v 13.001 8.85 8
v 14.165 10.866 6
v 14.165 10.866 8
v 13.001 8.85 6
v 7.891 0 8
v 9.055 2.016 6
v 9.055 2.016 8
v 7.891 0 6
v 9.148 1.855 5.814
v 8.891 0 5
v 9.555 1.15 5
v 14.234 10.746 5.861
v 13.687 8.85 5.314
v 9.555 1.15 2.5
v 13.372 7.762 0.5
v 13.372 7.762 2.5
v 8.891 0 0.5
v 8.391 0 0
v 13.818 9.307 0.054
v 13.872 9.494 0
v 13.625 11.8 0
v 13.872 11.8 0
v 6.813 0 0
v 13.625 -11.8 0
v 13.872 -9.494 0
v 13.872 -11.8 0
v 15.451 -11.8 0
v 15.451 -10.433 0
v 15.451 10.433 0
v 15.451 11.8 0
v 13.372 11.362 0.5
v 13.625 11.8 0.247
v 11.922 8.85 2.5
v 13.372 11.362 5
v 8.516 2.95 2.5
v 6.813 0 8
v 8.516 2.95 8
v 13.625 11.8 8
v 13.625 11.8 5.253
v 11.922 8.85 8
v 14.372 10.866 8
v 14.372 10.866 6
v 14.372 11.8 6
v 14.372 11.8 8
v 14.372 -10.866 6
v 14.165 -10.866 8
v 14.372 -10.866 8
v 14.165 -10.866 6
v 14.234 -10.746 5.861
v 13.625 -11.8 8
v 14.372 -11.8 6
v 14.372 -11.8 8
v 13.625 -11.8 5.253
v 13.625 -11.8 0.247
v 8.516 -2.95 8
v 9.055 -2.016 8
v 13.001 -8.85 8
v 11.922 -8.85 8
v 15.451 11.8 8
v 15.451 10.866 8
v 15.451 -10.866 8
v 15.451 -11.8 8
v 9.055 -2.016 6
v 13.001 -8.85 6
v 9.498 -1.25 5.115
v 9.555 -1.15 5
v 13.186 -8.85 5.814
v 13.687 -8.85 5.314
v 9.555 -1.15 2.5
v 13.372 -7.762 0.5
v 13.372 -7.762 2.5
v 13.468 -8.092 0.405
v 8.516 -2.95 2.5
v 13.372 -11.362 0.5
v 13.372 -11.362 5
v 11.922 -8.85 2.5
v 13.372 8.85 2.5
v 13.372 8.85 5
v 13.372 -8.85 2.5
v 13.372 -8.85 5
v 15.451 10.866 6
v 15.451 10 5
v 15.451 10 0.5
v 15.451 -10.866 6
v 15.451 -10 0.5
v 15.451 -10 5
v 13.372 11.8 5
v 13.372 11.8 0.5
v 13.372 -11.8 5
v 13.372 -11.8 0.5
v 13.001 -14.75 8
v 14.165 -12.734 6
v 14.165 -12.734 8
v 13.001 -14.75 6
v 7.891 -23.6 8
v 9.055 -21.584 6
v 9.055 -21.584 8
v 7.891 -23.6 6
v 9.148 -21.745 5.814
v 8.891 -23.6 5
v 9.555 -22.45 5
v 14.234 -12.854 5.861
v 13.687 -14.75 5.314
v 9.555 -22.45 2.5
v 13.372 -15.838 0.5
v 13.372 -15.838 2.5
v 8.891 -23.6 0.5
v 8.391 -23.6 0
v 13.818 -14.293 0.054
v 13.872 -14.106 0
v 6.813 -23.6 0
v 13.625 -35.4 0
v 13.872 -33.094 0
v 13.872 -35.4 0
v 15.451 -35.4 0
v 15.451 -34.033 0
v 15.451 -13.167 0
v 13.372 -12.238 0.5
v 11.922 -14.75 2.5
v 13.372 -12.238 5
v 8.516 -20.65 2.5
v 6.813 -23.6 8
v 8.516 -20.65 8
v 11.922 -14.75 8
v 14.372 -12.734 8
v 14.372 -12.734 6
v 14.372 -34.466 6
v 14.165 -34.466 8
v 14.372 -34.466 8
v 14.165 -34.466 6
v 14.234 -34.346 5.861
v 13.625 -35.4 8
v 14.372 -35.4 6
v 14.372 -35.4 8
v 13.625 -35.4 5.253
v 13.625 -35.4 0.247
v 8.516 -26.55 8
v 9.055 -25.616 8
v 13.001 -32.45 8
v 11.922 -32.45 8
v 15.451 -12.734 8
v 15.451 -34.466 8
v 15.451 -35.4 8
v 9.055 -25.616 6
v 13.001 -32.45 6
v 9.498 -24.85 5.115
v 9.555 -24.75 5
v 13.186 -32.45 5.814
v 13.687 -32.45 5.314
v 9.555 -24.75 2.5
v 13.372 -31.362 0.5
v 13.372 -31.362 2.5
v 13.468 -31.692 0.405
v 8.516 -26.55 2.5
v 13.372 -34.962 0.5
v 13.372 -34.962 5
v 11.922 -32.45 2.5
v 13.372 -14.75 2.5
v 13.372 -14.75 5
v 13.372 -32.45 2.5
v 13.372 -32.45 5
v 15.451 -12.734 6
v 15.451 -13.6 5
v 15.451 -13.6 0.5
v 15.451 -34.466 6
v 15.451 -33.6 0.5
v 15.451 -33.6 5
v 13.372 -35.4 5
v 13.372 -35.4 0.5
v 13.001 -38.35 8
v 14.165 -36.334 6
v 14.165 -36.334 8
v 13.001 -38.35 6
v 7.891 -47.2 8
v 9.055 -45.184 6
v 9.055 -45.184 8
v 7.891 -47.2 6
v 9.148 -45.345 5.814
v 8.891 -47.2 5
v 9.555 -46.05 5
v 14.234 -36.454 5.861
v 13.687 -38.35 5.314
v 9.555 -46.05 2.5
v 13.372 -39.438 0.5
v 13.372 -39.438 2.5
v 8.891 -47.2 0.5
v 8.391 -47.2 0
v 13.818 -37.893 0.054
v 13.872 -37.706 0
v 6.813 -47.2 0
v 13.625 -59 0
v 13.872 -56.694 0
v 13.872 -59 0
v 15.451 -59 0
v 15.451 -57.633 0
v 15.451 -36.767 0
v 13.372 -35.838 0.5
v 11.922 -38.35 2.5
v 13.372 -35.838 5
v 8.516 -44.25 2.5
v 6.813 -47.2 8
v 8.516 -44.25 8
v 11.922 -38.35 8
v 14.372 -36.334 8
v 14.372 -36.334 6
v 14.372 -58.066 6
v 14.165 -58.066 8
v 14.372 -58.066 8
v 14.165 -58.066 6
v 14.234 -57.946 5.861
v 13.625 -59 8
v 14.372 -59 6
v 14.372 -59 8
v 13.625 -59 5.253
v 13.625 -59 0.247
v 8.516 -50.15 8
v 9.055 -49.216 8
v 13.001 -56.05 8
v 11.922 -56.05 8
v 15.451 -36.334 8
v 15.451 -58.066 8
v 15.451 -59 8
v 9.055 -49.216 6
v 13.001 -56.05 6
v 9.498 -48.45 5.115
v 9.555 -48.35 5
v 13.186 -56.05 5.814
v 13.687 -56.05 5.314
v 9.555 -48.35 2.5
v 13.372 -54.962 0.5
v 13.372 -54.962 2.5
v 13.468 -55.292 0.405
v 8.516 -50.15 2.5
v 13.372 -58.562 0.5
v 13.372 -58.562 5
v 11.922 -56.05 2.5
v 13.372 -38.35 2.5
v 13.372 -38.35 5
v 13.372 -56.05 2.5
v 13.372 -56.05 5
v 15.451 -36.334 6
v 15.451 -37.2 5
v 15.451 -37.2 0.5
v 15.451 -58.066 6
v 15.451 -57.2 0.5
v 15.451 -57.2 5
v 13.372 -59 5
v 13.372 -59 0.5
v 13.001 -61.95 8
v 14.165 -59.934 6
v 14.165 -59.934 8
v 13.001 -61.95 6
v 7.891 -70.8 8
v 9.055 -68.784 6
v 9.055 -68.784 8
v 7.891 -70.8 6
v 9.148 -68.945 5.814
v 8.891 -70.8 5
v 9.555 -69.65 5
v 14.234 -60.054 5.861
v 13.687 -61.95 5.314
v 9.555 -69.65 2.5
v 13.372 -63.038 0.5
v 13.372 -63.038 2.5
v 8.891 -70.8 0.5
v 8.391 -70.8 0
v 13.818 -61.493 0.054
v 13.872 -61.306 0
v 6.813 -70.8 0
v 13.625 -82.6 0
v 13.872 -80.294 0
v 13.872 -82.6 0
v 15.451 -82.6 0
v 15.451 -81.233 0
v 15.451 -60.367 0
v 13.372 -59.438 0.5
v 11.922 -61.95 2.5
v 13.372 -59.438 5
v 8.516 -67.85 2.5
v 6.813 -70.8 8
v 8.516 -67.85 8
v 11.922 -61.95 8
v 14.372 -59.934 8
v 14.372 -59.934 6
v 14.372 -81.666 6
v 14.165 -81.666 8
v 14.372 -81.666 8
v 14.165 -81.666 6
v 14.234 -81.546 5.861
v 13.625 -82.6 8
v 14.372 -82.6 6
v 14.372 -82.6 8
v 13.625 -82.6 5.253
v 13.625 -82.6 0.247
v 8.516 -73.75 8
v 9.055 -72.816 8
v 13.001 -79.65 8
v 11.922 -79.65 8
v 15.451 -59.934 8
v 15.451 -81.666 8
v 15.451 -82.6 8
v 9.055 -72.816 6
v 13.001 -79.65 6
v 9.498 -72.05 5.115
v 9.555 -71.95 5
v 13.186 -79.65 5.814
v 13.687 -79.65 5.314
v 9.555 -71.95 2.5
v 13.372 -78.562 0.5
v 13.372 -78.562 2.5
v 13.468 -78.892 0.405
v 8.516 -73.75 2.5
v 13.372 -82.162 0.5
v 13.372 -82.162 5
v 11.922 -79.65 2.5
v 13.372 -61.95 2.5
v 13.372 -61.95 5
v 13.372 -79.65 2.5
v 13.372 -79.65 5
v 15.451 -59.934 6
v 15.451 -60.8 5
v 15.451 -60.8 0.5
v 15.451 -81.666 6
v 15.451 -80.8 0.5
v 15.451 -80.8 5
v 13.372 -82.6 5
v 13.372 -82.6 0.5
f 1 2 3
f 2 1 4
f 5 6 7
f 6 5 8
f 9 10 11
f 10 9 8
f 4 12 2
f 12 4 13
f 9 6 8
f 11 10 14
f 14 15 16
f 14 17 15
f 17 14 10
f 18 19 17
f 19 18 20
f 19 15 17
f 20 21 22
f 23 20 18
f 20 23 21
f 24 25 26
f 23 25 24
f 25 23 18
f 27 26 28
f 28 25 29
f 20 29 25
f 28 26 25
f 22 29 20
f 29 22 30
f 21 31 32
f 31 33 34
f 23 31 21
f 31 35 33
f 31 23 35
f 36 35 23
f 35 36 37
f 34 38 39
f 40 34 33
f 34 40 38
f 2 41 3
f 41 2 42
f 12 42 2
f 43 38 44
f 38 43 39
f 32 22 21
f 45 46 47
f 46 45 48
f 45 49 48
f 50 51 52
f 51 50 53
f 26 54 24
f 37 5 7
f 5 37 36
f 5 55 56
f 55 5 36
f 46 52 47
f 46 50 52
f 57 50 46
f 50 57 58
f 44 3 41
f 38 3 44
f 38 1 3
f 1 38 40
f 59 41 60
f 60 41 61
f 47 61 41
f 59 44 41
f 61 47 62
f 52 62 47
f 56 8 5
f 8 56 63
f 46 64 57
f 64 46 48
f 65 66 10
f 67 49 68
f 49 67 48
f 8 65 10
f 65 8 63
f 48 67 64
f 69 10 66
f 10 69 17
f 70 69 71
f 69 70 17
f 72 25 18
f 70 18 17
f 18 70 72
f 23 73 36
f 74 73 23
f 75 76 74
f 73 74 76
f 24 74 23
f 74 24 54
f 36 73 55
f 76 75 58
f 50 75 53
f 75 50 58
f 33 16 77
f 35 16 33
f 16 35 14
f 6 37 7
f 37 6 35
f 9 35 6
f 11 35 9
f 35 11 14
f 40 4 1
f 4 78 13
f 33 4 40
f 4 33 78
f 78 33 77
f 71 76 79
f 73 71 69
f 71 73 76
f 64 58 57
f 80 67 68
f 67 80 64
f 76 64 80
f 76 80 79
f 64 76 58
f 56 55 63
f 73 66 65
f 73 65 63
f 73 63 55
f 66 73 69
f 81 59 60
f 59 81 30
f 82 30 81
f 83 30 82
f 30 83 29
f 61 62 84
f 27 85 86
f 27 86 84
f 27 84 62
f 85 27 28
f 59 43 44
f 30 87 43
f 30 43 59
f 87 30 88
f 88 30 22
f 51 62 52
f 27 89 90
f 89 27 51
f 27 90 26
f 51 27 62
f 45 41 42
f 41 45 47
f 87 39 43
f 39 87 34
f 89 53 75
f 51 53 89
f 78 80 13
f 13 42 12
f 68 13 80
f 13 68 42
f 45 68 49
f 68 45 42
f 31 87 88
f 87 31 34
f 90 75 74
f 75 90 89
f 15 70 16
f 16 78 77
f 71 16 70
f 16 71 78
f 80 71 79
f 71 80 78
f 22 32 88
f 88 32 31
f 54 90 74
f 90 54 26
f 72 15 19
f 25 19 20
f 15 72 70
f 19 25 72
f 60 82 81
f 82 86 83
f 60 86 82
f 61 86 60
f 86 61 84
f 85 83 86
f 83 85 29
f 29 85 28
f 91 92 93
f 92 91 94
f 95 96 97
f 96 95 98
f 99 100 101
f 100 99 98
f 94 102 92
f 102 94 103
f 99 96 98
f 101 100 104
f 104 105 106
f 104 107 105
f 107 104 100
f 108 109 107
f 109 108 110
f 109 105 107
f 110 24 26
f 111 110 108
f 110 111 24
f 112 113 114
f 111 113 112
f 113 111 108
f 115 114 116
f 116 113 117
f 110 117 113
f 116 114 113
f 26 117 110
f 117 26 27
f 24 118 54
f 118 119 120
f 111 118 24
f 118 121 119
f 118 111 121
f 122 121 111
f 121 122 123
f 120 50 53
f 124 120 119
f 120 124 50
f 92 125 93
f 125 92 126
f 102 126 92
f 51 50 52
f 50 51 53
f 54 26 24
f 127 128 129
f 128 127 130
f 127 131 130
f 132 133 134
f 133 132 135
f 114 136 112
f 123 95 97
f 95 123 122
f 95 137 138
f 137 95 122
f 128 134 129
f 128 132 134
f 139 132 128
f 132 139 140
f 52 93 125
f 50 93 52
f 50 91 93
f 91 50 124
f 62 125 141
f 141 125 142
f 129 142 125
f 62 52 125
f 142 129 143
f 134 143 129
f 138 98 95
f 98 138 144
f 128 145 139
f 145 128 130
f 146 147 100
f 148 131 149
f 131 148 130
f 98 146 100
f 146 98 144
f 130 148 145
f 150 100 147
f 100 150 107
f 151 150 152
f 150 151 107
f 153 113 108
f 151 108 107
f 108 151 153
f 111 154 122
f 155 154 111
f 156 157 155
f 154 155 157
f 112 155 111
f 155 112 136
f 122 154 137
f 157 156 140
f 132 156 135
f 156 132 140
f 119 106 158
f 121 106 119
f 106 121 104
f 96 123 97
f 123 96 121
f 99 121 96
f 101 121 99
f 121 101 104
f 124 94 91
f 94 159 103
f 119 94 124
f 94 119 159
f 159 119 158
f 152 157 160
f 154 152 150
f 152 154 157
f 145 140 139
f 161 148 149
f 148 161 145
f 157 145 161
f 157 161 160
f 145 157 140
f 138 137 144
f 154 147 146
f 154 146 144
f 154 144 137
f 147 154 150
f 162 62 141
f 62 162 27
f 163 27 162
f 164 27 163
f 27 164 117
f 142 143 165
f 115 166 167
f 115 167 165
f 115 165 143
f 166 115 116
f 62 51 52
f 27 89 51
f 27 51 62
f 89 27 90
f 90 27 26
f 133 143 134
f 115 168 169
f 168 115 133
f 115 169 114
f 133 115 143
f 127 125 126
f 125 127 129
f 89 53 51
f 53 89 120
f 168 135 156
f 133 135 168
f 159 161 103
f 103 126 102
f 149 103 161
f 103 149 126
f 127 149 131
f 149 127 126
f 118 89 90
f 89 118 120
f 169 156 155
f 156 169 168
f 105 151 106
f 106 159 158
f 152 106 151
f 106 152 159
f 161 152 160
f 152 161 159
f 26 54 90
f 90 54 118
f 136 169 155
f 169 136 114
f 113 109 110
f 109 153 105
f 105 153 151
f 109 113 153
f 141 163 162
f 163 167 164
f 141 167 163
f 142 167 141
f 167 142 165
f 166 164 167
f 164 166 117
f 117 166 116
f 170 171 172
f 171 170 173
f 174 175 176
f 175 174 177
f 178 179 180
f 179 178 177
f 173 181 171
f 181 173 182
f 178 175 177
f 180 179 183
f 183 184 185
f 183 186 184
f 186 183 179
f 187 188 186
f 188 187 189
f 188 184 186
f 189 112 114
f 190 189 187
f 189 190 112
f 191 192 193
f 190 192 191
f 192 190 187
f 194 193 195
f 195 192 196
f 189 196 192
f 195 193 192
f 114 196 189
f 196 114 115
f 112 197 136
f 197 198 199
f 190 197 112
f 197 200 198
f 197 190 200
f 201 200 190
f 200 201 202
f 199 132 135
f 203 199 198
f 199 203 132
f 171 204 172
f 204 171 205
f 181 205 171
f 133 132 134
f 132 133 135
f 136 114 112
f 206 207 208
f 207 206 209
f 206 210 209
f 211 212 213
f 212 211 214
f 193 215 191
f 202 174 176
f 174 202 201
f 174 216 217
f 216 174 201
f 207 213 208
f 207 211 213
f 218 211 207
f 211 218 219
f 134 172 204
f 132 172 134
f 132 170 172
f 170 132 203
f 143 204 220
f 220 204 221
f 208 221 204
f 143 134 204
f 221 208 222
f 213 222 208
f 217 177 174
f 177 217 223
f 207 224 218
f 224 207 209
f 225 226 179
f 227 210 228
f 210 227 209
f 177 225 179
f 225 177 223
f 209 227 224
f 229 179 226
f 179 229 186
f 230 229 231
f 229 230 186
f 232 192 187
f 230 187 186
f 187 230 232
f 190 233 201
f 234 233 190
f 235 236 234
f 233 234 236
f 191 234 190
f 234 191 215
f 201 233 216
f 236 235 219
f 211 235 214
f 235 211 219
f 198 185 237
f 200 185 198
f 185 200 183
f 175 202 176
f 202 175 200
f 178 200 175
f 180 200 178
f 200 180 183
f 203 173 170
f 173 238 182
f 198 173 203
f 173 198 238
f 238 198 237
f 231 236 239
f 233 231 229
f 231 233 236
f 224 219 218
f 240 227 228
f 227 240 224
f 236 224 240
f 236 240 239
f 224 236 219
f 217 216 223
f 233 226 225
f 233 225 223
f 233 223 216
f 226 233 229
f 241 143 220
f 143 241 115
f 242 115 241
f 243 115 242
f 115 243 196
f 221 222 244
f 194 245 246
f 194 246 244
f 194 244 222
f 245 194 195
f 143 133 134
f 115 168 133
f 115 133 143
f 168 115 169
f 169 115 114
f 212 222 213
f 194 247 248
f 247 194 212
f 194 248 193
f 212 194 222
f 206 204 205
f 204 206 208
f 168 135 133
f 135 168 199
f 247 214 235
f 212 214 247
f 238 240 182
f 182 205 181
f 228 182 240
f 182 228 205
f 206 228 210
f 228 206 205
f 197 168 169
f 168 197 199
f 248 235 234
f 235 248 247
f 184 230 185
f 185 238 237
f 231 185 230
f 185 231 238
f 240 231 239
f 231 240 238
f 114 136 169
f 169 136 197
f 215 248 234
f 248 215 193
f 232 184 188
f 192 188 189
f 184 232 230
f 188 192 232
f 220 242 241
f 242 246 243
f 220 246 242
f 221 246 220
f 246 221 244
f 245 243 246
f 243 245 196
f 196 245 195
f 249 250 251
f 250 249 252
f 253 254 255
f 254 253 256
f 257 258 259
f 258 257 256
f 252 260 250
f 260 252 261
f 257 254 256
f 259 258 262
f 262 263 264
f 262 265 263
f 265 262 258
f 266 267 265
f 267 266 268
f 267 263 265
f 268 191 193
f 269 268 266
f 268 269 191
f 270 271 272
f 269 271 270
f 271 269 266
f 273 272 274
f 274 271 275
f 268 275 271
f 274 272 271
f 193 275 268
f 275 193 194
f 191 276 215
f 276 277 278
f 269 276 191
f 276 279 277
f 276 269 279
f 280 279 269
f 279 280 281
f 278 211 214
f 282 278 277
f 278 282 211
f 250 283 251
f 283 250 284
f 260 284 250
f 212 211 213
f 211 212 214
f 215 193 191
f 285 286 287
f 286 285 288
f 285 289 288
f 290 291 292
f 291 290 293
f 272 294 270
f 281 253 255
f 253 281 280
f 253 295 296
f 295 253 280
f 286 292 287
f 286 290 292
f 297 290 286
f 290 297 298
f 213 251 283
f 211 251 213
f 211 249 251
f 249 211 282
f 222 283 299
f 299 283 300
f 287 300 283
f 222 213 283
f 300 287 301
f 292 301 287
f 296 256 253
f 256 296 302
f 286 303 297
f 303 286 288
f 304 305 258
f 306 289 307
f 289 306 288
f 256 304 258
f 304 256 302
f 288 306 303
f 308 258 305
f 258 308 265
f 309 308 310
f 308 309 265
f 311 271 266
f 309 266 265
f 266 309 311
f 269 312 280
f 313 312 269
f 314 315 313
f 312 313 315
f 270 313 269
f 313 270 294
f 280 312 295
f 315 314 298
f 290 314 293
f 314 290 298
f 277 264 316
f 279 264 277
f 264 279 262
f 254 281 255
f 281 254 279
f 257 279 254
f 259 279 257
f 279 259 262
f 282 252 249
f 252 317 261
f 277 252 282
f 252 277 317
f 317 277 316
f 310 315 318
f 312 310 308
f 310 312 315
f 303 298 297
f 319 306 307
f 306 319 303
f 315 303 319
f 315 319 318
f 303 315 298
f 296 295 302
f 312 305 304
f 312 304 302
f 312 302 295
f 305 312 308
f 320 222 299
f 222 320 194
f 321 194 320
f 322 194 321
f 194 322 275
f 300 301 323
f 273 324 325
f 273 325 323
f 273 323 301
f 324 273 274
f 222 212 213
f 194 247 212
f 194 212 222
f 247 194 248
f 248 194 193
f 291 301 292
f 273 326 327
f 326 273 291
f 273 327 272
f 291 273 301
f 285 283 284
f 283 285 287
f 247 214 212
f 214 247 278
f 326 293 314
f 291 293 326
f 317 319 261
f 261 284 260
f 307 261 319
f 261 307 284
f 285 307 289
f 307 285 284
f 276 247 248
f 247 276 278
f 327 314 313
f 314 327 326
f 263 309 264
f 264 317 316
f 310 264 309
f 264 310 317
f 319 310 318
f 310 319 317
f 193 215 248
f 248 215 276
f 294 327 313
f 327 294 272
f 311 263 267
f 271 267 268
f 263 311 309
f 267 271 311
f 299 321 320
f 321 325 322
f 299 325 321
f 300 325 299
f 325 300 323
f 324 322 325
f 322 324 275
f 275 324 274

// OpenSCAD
// file: honeycomb_element.scad
$fn = 50;

radius = 13.6;
diameter =  radius * 2;

h_inner = 10;
r_inner = h_inner * 2/sqrt(3);

h_outer = 10+1.8;
r_outer = h_outer * 2/sqrt(3);


h_thin = 10+1;
r_thin = h_thin * 2/sqrt(3);

total_height = 8;

small_value = 0.1;


clips_height = 5;
clips_offset = 0.5;
clips_side_offset = 0.00;


module basic_polygon() {
  polygon([[r_outer, total_height], [r_outer, 0], [r_inner+0.5, 0], [r_inner, 0.5], 
        [r_inner, total_height-3], [r_inner+1, total_height-2], [r_inner+1,total_height]]);    
}

module basic_model() {
  rotate_extrude($fn=6) {
      basic_polygon();
  }
}


module panel_with_clips(pin_1=false, pin_2=false, pin_3=false, pin_4=false, pin_5=false, pin_6=false, slot_1=false, slot_2=false, slot_3=false, slot_4=false, slot_5=false, slot_6=false) {

  difference() {
    basic_model();

    if (slot_1) {
      rotate([0, 0, 0])
        translate([0, -h_outer*2, total_height - (clips_height+clips_offset)/2])
          linear_extrude(height=clips_height+clips_offset, center=true)
            polygon([[clips_side_offset, h_outer/2], [-clips_side_offset, h_outer/2], [-r_outer/2-clips_side_offset, h_outer*1.5], [r_outer/2+clips_side_offset, h_outer*1.5]]);
    }

    if (slot_2) {
      rotate([0, 0, 60])
        translate([0, -h_outer*2, total_height - (clips_height+clips_offset)/2])
          linear_extrude(height=clips_height+clips_offset, center=true)
            polygon([[clips_side_offset, h_outer/2], [-clips_side_offset, h_outer/2], [-r_outer/2-clips_side_offset, h_outer*1.5], [r_outer/2+clips_side_offset, h_outer*1.5]]);
    }



    if (slot_3) {
      rotate([0, 0, 120])
        translate([0, -h_outer*2, total_height - (clips_height+clips_offset)/2])
          linear_extrude(height=clips_height+clips_offset, center=true)
            polygon([[clips_side_offset, h_outer/2], [-clips_side_offset, h_outer/2], [-r_outer/2-clips_side_offset, h_outer*1.5], [r_outer/2+clips_side_offset, h_outer*1.5]]);
    }

    if (slot_4) {
      rotate([0, 0, 180])
        translate([0, -h_outer*2, total_height - (clips_height+clips_offset)/2])
          linear_extrude(height=clips_height+clips_offset, center=true)
            polygon([[clips_side_offset, h_outer/2], [-clips_side_offset, h_outer/2], [-r_outer/2-clips_side_offset, h_outer*1.5], [r_outer/2+clips_side_offset, h_outer*1.5]]);
    }

    if (slot_5) {
      rotate([0, 0, 240])
        translate([0, -h_outer*2, total_height - (clips_height+clips_offset)/2])
          linear_extrude(height=clips_height+clips_offset, center=true)
            polygon([[clips_side_offset, h_outer/2], [-clips_side_offset, h_outer/2], [-r_outer/2-clips_side_offset, h_outer*1.5], [r_outer/2+clips_side_offset, h_outer*1.5]]);
    }

    if (slot_6) {
      rotate([0, 0, 300])
        translate([0, -h_outer*2, total_height - (clips_height+clips_offset)/2])
          linear_extrude(height=clips_height+clips_offset, center=true)
            polygon([[clips_side_offset, h_outer/2], [-clips_side_offset, h_outer/2], [-r_outer/2-clips_side_offset, h_outer*1.5], [r_outer/2+clips_side_offset, h_outer*1.5]]);
    }
  }


  if (pin_1) {
    intersection() {
      translate([0,-h_outer*2, 0])
        basic_model();
      translate([0, 0, total_height - clips_height/2]) {
        rotate([0, 0, -180])  
          linear_extrude(height=clips_height, center=true)
            polygon([[0, h_outer/2], [-r_outer/2, h_outer*1.5], [r_outer/2, h_outer*1.5]]);  
      }
    }
  }

  if (pin_2) {
    intersection() {
      translate([r_outer*1.5,-h_outer, 0])
        basic_model();
      translate([0, 0, total_height - clips_height/2]) {
        rotate([0, 0, -120])  
          linear_extrude(height=clips_height, center=true)
            polygon([[0, h_outer/2], [-r_outer/2, h_outer*1.5], [r_outer/2, h_outer*1.5]]);  
      }
    }
  }


  if (pin_3) {
    intersection() {
      translate([r_outer*1.5,h_outer, 0])
        basic_model();
      translate([0, 0, total_height - clips_height/2]) {
        rotate([0, 0, -60])  
          linear_extrude(height=clips_height, center=true)
            polygon([[0, h_outer/2], [-r_outer/2, h_outer*1.5], [r_outer/2, h_outer*1.5]]);  
      }
    }
  }

  if (pin_4) {
    intersection() {
      translate([0, h_outer*2, 0])
        basic_model();

      translate([0, 0, total_height - clips_height/2]) {
        linear_extrude(height=clips_height, center=true)
          polygon([[0, h_outer/2], [-r_outer/2, h_outer*1.5], [r_outer/2, h_outer*1.5]]);
      }  
    }
  }

  if (pin_5) {
    intersection() {
      translate([-r_outer*1.5,h_outer, 0])
        basic_model();
      translate([0, 0, total_height - clips_height/2]) {
        rotate([0, 0, 60])  
          linear_extrude(height=clips_height, center=true)
            polygon([[0, h_outer/2], [-r_outer/2, h_outer*1.5], [r_outer/2, h_outer*1.5]]);  
      }
    }
  }
  
  if (pin_6) {
    intersection() {
      translate([-r_outer*1.5, -h_outer, 0])
        basic_model();

      translate([0, 0, total_height - clips_height/2]) {
        rotate([0, 0, 120])  
          linear_extrude(height=clips_height, center=true)
            polygon([[0, h_outer/2], [-r_outer/2, h_outer*1.5], [r_outer/2, h_outer*1.5]]);  
      }
    }
  }
}

// end honeycomb_element.scad
// main file
$fn = 50;


h_outer = 10+1.8;
r_outer = h_outer * 2/sqrt(3);

use <honeycomb_element.scad>; 

module perimeter_right_item(slot_5=true, slot_6=true) {
  difference() {
      translate([r_outer * 1.5, 0, 0])
        panel_with_clips(slot_6=slot_6, slot_5=slot_5);
      translate([50+r_outer * 1.5-r_outer/2 + (r_outer-h_outer), 0, 0])
        cube([100, 100, 100], center = true);
  }
  translate([0 + r_outer-h_outer, 0, 0])
    rotate([90, 0, 0])
      linear_extrude(height = h_outer * 2, center=true)
        basic_polygon();
}



module perimeter_right() {  
    
    for (i = [0:3]) {    
      translate([0, -h_outer*2*i, 0])
        perimeter_right_item();   
    }
}



perimeter_right();
